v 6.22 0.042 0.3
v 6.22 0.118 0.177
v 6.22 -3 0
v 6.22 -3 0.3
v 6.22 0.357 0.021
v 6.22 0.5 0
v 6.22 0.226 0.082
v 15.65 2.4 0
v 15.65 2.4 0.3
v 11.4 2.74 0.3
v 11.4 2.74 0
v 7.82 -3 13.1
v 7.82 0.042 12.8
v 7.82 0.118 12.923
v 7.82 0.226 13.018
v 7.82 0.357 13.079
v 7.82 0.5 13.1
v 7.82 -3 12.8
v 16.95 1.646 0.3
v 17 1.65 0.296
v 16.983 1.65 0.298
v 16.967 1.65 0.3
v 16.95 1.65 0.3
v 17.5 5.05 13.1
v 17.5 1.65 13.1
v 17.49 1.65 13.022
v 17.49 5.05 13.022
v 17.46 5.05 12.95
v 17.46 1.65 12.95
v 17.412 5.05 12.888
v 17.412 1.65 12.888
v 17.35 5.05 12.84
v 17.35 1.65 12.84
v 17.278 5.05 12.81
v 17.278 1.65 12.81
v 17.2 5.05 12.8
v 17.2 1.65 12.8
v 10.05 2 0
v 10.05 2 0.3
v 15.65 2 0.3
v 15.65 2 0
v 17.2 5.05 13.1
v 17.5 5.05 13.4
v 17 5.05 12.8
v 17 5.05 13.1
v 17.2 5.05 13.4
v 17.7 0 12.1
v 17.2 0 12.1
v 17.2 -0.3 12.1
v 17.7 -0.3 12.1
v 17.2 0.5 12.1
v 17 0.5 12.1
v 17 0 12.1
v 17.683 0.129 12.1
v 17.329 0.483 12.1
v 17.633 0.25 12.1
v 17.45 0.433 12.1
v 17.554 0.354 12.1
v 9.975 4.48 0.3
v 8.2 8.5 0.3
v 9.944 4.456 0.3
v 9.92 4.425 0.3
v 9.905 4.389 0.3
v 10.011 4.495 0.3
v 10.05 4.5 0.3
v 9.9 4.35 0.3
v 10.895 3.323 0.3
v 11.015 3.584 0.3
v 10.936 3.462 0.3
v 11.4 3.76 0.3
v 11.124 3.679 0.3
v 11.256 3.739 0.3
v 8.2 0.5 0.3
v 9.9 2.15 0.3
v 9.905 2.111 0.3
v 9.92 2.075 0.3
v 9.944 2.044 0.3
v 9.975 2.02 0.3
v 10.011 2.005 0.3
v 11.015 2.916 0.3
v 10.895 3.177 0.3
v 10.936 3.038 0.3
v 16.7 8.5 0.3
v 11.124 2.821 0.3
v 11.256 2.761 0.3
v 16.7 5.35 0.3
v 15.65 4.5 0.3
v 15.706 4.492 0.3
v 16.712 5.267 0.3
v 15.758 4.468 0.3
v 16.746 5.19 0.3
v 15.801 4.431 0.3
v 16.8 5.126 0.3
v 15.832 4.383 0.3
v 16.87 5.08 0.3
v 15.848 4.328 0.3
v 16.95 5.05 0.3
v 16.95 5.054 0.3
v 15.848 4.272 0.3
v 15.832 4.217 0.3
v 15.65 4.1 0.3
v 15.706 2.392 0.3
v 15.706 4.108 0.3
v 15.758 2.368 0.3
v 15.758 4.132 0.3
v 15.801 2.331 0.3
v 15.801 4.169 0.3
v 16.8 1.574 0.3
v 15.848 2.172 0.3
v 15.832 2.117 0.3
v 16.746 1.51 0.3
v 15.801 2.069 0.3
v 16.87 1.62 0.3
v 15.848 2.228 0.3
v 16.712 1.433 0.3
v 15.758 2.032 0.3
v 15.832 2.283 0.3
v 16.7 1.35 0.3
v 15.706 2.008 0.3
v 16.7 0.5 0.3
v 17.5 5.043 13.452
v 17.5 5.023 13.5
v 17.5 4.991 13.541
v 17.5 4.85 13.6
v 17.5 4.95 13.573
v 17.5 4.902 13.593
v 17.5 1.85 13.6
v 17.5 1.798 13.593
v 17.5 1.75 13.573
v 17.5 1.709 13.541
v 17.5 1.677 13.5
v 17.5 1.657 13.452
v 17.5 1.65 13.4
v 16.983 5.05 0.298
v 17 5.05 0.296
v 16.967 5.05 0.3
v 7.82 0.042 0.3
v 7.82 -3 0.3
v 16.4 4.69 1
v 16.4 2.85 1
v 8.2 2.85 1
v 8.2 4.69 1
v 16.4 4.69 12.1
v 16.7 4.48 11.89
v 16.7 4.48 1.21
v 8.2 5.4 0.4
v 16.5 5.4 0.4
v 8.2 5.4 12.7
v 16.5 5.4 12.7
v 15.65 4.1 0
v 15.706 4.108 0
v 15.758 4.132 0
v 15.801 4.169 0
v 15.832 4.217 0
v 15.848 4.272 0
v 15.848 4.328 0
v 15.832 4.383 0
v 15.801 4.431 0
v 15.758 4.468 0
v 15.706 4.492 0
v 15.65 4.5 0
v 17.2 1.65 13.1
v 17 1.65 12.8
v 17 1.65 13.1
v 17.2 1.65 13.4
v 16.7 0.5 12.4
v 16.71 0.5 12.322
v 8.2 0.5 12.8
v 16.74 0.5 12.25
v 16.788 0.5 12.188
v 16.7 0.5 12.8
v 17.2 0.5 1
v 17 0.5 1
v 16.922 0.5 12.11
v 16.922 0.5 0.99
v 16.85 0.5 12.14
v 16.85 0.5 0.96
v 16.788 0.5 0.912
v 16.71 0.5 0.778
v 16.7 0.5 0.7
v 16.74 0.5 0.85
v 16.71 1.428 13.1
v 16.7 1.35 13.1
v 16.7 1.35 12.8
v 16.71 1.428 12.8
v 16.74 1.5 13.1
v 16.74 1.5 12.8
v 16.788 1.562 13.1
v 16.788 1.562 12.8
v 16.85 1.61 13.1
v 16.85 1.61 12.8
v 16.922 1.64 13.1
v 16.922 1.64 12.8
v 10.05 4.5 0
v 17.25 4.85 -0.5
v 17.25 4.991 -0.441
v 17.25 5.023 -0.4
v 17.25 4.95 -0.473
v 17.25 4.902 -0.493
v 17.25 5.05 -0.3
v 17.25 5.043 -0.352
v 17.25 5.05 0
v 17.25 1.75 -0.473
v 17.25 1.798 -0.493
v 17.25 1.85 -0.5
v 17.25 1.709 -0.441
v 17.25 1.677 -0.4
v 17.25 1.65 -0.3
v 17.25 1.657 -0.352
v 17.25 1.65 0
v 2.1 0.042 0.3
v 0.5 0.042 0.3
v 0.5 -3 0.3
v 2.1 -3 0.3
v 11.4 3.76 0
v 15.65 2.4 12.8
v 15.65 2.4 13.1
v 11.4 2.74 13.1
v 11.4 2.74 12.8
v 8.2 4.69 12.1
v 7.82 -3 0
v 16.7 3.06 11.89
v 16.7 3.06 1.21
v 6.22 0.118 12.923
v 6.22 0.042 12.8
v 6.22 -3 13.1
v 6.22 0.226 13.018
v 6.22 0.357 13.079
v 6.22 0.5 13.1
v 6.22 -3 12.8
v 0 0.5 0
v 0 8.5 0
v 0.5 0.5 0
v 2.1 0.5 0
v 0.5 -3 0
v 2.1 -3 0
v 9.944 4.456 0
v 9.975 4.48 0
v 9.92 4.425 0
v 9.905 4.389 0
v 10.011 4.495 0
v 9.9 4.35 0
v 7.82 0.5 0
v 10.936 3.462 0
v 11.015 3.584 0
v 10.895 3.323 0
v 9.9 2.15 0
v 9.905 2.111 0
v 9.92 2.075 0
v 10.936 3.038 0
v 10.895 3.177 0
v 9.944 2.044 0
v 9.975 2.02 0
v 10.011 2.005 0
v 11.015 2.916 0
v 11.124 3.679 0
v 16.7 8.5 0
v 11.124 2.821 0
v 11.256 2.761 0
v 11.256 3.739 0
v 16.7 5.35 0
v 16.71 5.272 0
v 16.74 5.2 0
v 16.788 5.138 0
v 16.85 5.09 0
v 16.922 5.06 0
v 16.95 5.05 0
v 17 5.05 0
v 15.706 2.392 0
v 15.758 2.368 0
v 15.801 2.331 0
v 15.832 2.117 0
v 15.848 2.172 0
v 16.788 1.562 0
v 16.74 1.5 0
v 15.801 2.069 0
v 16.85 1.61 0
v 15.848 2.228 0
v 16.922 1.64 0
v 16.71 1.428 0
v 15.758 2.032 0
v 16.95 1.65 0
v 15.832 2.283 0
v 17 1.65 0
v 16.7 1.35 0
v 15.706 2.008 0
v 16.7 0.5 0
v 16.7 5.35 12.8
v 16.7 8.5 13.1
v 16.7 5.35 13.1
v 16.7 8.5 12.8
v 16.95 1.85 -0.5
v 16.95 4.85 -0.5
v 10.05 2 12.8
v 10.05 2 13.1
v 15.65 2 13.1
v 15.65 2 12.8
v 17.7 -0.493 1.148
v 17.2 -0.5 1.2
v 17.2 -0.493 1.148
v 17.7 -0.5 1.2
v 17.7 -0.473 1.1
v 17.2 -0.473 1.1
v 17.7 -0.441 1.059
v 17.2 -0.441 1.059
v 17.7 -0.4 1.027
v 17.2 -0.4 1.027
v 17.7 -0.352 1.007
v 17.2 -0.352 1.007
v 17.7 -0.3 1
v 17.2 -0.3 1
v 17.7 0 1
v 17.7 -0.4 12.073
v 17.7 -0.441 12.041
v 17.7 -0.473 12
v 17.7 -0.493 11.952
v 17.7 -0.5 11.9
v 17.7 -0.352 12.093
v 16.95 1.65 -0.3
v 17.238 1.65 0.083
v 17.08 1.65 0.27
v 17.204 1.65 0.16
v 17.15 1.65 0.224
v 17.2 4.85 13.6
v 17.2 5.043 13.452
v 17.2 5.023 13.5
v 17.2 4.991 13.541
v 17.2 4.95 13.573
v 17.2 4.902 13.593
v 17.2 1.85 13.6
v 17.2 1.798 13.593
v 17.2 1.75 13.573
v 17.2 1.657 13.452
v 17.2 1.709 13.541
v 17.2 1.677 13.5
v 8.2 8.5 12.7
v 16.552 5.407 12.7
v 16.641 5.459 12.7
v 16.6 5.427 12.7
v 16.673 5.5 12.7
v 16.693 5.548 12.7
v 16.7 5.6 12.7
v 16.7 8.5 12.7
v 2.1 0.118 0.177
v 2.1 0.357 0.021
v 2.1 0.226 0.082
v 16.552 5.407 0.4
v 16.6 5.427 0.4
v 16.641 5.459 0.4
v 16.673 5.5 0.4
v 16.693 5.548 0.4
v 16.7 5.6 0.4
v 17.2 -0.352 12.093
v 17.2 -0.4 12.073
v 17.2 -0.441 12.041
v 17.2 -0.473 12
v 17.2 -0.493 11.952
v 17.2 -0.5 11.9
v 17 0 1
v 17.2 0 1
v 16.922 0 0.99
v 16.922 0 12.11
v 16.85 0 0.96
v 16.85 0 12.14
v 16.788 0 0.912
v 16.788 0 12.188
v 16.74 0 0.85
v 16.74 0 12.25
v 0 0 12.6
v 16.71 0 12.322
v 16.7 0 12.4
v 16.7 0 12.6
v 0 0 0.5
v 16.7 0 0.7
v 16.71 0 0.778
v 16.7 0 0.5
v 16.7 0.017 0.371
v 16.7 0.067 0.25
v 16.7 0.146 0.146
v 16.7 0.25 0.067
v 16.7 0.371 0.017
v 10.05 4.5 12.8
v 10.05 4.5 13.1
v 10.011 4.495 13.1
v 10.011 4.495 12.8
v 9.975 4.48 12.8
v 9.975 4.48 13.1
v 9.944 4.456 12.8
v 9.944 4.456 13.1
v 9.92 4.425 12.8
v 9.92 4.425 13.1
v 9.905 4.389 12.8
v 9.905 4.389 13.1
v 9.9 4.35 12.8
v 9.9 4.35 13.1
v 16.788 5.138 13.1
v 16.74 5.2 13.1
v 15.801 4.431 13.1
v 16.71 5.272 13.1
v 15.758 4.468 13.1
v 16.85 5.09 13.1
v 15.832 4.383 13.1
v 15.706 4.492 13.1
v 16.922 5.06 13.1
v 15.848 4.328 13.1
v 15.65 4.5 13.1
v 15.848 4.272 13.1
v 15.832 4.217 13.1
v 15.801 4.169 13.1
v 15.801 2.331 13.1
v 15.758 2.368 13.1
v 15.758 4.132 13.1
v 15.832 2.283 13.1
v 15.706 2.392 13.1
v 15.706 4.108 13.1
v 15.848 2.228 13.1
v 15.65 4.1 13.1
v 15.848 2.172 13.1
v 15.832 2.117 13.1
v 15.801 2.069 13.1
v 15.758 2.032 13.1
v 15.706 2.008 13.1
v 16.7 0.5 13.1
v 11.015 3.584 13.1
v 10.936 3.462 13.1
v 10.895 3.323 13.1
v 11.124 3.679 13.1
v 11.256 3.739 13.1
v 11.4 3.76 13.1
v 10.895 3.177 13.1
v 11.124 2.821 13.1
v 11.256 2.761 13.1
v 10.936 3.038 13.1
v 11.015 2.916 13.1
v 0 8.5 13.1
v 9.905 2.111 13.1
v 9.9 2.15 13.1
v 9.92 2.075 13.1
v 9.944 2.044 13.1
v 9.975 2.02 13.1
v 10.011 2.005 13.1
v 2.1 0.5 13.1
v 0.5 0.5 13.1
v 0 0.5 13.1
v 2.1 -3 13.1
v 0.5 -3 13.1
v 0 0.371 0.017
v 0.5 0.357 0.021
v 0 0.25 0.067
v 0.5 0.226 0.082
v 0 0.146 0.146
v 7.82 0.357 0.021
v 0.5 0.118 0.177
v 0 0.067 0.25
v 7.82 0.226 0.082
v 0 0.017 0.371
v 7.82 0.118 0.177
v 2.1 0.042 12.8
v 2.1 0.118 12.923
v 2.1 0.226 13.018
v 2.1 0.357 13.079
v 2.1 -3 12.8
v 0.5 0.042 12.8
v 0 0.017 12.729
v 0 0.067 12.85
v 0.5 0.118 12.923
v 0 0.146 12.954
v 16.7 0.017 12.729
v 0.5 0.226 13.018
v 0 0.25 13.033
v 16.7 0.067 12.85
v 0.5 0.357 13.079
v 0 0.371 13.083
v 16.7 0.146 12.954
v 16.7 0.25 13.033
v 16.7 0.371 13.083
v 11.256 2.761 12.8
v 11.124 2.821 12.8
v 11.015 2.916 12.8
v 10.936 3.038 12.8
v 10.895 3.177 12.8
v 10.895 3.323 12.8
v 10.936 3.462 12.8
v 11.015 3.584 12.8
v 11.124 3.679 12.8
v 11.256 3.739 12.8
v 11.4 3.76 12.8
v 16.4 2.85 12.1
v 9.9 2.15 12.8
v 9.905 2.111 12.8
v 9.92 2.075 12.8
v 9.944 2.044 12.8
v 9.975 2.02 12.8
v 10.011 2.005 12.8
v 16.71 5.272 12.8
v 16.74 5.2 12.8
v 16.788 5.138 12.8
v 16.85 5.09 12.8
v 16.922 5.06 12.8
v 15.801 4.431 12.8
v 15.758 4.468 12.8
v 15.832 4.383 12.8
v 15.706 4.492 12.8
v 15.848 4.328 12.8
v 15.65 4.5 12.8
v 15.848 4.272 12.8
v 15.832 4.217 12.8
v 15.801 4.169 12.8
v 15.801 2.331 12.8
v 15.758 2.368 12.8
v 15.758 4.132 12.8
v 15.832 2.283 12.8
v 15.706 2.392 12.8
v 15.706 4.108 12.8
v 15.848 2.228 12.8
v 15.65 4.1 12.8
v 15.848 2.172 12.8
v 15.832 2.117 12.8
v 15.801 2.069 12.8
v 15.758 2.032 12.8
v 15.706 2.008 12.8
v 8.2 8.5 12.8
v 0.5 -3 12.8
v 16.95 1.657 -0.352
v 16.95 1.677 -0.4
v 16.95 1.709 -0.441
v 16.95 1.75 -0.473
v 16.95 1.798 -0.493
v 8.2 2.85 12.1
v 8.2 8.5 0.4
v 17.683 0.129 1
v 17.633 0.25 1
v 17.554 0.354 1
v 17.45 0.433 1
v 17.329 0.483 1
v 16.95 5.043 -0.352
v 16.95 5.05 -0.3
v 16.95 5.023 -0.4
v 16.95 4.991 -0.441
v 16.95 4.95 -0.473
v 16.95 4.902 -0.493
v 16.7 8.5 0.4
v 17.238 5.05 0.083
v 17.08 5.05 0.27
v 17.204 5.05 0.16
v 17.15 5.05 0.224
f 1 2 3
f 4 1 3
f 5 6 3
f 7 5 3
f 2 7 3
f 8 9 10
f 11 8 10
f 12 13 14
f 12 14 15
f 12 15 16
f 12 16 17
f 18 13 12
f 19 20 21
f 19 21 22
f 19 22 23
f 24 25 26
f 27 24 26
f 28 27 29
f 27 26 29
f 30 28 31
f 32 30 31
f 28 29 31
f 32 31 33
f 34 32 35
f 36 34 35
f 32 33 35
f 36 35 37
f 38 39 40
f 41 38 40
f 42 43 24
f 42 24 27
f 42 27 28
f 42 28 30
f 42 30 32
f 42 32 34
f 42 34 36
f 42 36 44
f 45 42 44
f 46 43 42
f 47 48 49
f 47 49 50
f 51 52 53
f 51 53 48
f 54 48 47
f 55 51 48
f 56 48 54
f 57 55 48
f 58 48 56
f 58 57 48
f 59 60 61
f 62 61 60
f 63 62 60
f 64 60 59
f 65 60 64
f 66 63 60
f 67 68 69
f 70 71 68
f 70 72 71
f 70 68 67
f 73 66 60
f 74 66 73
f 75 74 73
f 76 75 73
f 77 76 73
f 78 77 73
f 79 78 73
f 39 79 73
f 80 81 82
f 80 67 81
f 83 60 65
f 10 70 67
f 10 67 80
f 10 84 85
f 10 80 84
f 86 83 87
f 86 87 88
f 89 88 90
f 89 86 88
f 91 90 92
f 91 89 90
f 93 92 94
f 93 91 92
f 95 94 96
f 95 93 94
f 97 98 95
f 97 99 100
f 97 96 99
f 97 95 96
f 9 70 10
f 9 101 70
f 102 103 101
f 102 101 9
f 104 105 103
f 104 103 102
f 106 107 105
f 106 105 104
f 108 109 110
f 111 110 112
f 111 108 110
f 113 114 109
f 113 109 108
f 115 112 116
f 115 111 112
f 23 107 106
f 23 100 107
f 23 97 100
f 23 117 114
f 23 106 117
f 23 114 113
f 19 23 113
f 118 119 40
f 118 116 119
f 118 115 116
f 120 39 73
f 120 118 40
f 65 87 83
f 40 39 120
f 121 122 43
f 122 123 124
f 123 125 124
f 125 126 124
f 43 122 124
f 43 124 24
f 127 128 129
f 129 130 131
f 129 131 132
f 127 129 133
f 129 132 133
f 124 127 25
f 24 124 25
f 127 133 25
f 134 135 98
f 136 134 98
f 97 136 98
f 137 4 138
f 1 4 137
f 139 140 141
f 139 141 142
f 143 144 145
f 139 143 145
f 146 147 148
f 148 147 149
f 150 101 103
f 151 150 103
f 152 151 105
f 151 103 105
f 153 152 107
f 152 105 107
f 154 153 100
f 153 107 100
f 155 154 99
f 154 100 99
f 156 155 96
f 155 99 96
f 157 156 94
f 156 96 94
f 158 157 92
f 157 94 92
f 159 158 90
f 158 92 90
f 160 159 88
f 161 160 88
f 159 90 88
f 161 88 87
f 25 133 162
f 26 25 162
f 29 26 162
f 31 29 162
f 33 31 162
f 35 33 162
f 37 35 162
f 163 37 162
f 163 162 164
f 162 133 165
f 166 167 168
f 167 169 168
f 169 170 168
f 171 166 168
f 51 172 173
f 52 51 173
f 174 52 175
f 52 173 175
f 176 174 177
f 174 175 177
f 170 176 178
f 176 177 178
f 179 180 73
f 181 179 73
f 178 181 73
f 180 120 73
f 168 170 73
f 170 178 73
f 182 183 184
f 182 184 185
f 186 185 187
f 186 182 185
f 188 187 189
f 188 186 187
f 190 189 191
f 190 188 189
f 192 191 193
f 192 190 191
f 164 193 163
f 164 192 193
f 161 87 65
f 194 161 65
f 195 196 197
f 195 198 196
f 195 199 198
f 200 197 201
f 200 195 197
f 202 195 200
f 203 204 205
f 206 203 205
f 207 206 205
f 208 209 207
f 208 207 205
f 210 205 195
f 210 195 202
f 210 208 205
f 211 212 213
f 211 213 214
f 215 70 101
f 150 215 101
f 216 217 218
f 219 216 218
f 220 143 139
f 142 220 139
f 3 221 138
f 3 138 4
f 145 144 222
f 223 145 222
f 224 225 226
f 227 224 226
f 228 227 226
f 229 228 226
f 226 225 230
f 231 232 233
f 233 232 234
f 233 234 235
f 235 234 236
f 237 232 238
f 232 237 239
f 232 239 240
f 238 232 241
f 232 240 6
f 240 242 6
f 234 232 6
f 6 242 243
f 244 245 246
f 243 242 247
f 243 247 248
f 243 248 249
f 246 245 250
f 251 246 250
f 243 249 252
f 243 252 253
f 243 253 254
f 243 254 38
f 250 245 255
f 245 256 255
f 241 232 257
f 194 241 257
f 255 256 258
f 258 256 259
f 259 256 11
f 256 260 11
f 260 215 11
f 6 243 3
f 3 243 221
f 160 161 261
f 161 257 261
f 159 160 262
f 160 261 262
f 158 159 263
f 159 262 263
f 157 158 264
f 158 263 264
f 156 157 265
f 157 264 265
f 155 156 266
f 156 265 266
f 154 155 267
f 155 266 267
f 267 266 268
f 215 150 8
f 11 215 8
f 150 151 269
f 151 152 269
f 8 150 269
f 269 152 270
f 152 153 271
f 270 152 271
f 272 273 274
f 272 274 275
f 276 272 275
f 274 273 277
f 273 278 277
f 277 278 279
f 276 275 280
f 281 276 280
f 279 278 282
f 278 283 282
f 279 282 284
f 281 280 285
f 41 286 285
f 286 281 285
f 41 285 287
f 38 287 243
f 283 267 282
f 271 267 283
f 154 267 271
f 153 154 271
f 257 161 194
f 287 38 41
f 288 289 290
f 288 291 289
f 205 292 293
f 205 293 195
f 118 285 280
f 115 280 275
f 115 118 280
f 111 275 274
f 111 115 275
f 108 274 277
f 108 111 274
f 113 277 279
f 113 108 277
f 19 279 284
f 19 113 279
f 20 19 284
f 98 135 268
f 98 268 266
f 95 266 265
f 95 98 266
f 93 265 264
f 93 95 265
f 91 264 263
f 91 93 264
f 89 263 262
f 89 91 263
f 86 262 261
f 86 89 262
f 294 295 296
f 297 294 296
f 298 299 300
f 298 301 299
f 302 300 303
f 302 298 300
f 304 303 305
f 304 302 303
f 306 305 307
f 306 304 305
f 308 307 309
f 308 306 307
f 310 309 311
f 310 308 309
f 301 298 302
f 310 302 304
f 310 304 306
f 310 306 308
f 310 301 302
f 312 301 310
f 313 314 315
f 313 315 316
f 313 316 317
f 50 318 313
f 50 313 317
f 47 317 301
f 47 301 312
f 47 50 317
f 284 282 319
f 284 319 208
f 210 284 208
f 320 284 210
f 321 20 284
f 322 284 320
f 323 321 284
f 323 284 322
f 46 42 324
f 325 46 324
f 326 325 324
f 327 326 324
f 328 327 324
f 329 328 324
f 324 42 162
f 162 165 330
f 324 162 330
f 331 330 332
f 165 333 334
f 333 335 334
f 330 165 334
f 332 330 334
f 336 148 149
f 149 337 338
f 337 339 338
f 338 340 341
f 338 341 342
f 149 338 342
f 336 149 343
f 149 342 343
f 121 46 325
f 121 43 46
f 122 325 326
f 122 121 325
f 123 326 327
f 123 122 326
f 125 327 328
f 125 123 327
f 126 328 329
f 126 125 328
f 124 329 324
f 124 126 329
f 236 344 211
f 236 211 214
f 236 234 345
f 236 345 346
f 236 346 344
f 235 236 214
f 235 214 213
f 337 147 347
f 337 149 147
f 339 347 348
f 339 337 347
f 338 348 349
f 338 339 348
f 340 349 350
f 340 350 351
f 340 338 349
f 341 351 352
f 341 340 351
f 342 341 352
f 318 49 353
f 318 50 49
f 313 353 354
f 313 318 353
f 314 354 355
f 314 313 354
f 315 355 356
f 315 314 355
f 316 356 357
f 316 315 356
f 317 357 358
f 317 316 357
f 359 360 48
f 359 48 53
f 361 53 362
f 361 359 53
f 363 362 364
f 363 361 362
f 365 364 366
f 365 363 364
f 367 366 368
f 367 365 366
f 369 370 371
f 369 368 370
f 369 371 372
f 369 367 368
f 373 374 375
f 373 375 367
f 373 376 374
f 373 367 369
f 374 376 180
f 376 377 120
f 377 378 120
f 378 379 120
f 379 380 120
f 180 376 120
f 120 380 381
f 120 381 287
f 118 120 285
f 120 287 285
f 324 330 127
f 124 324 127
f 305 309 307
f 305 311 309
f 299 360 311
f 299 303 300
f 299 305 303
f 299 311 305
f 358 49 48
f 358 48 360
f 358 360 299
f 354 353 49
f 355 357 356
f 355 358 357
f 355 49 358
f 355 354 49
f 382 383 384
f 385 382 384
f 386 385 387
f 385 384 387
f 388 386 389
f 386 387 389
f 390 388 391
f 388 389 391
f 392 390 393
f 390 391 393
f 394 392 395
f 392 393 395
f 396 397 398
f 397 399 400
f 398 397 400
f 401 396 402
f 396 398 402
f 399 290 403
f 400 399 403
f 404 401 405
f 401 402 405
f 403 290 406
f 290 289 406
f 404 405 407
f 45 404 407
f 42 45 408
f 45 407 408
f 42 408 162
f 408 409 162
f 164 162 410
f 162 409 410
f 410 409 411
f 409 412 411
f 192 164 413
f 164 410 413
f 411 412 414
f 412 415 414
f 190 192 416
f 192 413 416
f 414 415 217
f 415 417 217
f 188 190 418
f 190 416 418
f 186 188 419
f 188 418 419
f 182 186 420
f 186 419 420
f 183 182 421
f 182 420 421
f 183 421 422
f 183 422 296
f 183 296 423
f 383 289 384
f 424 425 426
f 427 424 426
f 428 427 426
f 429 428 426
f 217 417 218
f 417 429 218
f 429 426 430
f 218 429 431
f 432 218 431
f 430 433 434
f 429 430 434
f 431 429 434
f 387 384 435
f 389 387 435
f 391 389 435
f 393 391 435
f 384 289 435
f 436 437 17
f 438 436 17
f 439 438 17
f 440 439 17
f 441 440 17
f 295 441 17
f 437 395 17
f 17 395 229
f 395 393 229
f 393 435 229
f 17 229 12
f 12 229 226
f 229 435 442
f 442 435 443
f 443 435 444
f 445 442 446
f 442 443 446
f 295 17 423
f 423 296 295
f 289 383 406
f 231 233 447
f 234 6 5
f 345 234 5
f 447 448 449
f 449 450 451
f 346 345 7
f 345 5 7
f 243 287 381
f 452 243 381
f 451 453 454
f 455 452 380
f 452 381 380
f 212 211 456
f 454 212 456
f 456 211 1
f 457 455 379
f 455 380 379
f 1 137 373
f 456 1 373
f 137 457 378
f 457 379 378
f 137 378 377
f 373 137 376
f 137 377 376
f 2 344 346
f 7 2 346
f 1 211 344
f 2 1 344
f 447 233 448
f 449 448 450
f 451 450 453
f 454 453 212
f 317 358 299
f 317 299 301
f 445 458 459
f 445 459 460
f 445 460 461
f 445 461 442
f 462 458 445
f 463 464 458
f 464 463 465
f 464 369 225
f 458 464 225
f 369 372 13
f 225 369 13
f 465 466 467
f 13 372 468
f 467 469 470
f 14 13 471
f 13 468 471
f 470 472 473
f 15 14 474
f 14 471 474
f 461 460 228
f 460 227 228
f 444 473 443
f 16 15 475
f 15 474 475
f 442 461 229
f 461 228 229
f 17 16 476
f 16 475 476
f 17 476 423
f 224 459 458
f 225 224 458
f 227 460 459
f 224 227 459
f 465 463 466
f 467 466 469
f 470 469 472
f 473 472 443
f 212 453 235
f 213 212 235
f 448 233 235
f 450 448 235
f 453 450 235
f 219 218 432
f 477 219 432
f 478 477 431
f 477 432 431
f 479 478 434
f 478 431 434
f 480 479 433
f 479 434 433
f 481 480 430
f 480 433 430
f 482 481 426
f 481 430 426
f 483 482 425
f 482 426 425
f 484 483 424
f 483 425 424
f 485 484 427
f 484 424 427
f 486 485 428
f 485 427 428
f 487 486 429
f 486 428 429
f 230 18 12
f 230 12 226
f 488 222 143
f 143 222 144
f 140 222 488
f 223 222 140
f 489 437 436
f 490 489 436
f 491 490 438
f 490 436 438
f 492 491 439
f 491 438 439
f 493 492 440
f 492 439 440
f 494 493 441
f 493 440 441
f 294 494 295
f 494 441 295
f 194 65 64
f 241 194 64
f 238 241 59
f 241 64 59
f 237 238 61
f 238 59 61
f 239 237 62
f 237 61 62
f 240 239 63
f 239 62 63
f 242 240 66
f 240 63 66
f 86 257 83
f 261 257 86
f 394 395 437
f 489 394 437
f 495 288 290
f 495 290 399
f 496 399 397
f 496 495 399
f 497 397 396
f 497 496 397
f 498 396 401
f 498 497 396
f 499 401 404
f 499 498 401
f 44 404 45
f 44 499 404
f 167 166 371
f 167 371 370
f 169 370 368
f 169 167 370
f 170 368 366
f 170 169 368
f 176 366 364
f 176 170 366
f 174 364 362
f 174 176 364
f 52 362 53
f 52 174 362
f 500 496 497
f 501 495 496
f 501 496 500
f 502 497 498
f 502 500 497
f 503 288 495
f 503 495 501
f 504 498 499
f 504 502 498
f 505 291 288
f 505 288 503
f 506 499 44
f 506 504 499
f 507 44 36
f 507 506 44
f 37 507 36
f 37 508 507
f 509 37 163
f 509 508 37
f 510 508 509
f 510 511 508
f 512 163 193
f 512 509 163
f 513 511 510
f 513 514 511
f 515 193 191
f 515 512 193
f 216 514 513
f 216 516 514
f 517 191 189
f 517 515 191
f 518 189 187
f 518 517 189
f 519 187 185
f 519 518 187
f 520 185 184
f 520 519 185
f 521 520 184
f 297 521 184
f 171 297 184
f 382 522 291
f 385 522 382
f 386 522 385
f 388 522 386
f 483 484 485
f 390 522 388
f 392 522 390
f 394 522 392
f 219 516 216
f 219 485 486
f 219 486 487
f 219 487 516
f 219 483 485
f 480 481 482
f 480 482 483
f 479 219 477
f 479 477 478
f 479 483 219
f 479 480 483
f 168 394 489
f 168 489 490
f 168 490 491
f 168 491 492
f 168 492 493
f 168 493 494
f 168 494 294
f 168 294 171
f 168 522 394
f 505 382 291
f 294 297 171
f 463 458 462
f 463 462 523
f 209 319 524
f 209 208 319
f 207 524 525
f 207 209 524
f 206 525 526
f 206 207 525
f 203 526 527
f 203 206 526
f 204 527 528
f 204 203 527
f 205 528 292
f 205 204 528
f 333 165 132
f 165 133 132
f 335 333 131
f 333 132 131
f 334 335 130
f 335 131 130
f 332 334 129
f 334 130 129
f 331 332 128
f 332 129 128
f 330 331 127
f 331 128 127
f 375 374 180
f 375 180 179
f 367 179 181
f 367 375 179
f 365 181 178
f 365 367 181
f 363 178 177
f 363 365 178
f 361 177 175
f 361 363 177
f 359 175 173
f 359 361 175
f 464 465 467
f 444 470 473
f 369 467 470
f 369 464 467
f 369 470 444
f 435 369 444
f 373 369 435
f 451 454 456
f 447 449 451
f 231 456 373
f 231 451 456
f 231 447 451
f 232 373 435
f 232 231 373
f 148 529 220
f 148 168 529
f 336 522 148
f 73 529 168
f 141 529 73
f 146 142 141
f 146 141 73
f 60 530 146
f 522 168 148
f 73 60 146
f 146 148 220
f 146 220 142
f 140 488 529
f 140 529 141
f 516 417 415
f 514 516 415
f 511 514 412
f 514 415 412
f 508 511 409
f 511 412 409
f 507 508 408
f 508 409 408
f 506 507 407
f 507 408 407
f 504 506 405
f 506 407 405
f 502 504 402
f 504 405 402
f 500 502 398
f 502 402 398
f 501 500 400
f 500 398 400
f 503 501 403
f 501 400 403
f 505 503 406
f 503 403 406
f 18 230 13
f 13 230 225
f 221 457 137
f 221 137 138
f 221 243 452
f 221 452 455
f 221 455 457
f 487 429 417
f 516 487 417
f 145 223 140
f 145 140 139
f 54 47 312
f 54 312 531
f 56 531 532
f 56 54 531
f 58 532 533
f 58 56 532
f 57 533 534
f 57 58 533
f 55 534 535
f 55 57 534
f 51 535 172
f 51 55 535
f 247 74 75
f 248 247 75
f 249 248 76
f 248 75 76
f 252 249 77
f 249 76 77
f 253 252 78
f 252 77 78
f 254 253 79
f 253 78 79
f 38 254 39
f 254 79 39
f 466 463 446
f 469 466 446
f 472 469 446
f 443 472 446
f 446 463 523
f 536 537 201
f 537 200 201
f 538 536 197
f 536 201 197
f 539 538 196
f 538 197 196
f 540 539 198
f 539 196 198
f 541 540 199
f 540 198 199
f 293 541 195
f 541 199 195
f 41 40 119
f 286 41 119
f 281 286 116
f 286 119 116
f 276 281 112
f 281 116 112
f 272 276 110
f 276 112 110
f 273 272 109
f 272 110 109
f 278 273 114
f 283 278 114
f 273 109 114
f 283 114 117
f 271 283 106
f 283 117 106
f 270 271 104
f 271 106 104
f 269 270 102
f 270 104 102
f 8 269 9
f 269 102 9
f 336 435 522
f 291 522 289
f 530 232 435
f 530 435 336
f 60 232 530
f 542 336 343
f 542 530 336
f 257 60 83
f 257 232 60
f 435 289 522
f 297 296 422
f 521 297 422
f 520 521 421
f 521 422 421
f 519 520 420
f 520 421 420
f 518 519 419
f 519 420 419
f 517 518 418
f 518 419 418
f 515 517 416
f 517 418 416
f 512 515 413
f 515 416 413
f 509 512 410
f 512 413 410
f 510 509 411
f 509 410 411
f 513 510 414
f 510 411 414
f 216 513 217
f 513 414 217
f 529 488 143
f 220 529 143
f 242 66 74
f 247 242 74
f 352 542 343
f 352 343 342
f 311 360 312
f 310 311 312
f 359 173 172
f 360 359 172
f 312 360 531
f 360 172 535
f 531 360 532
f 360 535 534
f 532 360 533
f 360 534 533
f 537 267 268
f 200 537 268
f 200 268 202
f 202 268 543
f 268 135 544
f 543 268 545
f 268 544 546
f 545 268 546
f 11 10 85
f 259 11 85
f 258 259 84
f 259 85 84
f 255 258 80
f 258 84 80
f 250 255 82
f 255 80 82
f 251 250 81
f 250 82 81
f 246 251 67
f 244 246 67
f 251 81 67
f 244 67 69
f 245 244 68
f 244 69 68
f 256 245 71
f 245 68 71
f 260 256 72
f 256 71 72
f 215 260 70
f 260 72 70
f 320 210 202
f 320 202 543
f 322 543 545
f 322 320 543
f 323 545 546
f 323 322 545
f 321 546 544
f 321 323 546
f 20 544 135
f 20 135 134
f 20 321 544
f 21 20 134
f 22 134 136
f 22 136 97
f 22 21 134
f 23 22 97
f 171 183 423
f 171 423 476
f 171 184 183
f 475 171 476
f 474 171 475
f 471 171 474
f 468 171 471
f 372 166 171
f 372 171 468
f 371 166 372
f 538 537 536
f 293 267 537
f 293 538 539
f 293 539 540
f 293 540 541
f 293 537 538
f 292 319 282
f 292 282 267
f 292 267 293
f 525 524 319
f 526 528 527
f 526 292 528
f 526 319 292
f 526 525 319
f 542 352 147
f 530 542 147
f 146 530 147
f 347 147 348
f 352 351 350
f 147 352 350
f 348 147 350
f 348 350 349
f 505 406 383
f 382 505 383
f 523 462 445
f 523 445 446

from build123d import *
from OCP.BRepFilletAPI import BRepFilletAPI_MakeChamfer

# Parameters (mm, degrees)
BOSS_EXTRU_1_DEPTH      = 13.1
ESQUISSE2_W             = 12.5
ESQUISSE2_H             = 3
ENL_V_MAT_EXTRU_1_DEPTH = 7.4
ESQUISSE3_W             = 11.1
ESQUISSE3_H             = 1.84
ENL_V_MAT_EXTRU_2_DEPTH = 8.5
ESQUISSE4_W             = 0.3
ESQUISSE4_H             = 3.4
BOSS_EXTRU_2_DEPTH      = 0.5
BOSS_EXTRU_3_DEPTH      = 3.4
BOSS_EXTRU_4_DEPTH      = 3.4
CHANFREIN1_SIZE         = 0.3
CHANFREIN1_SIZE2        = 0.210062261
CHANFREIN2_SIZE         = 0.3
CHANFREIN2_SIZE2        = 0.210062261
CHANFREIN3_SIZE         = 0.3
CHANFREIN3_SIZE2        = 0.210062261
CONG_1_R                = 0.2
CONG_2_R                = 0.2
ESQUISSE10_W            = 0.5
ESQUISSE10_H            = 0.5
ENL_V_MAT_EXTRU_3_DEPTH = 1
ESQUISSE11_W            = 0.5
ESQUISSE11_H            = 0.5
ENL_V_MAT_EXTRU_4_DEPTH = 1
BOSS_EXTRU_5_DEPTH      = 11.1
CONG_3_R                = 0.5
CONG_4_R                = 0.5
ENL_V_MAT_EXTRU_5_DEPTH = 0.3
ENL_V_START             = -0.3
ENL_V_MAT_EXTRU_6_DEPTH = 0.3
CONG_5_R                = 0.2
CONG_6_R                = 0.3


with BuildPart() as part:
    # Esquisse1 → Boss.-Extru.1 (new body)
    with BuildSketch(Plane.XY):
        Polygon((0, 0), (0, 8.5), (16.7, 8.5), (16.7, 0.5), (17.2, 0.5), (17.2, 0), (7.82, 0), (7.82, -3), (6.22, -3), (6.22, 0), (2.1, 0), (2.1, -3), (0.5, -3), (0.5, 0), align=None)
    extrude(amount=BOSS_EXTRU_1_DEPTH)

    # Esquisse2 → Enlèv. mat.-Extru.1 (cut)
    with BuildSketch(Plane.ZY.offset(-0.5)):
        with Locations((6.55, -1.5)):
            Rectangle(ESQUISSE2_W, ESQUISSE2_H)
    extrude(amount=-ENL_V_MAT_EXTRU_1_DEPTH, mode=Mode.SUBTRACT)

    # Esquisse3 → Enlèv. mat.-Extru.2 (cut)
    with BuildSketch(Plane(origin=(16.7, 0, 0), x_dir=(0, 0, -1), z_dir=(1, 0, 0))):
        Polygon((-12.8, 8.5), (-12.8, 0.5), (-0.3, 0.5), (-0.3, 8.5), (-0.4, 8.5), (-0.4, 5.4), (-12.7, 5.4), (-12.7, 8.5), align=None)
        with Locations((-6.55, 3.77)):
            Rectangle(ESQUISSE3_W, ESQUISSE3_H, mode=Mode.SUBTRACT)
    extrude(amount=-ENL_V_MAT_EXTRU_2_DEPTH, mode=Mode.SUBTRACT)

    # Esquisse4 → Boss.-Extru.2 (add)
    with BuildSketch(Plane(origin=(16.7, 0, 0), x_dir=(0, 0, -1), z_dir=(1, 0, 0))):
        with Locations((-12.95, 3.35)):
            Rectangle(ESQUISSE4_W, ESQUISSE4_H)
    extrude(amount=BOSS_EXTRU_2_DEPTH)

    # Esquisse8 → Boss.-Extru.3 (add)
    with BuildSketch(Plane(origin=(17.2, 1.65, 13.1), x_dir=(1, 0, 0), z_dir=(0, -1, 0))):
        with BuildLine():
            Line((0, 0), (0, 0.5))
            Line((0, 0.5), (0.3, 0.5))
            Line((0.3, 0.5), (0.3, 0))
            ThreePointArc((0.3, 0), (0.212132034, -0.212132034), (0, -0.3))
            Line((0, -0.3), (0, 0))
        make_face()
    extrude(amount=-BOSS_EXTRU_3_DEPTH)

    # Esquisse9 → Boss.-Extru.4 (add)
    with BuildSketch(Plane(origin=(17.2, 1.65, 13.1), x_dir=(1, 0, 0), z_dir=(0, -1, 0))):
        with BuildLine():
            Line((-0.5, -13.1), (-0.25, -13.1))
            Line((-0.25, -13.1), (-0.25, -13.6))
            Line((-0.25, -13.6), (0.05, -13.6))
            Line((0.05, -13.6), (0.05, -13.1))
            ThreePointArc((0.05, -13.1), (-0.037867966, -12.887867966), (-0.25, -12.8))
            Line((-0.25, -12.8), (-0.5, -12.8))
            Line((-0.5, -12.8), (-0.5, -13.1))
        make_face()
    extrude(amount=-BOSS_EXTRU_4_DEPTH)

    # Chanfrein1
    chanfrein1_edges = [part.edges().sort_by_distance(p)[0] for p in [
        (16.7, 4.69, 6.55),
    ]]
    chanfrein1_side = [part.faces().sort_by_distance(p)[0] for p in [
        (12.45, 4.69, 6.55),
    ]]
    chamfer(chanfrein1_edges, length=CHANFREIN1_SIZE, length2=CHANFREIN1_SIZE2, reference=chanfrein1_side[0])

    # Chanfrein2
    chanfrein2_edges = [part.edges().sort_by_distance(p)[0] for p in [
        (16.7, 3.664968869, 1),
    ]]
    chanfrein2_side = [part.faces().sort_by_distance(p)[0] for p in [
        (12.441622268, 3.768284121, 1),
    ]]
    chamfer(chanfrein2_edges, length=CHANFREIN2_SIZE, length2=CHANFREIN2_SIZE2, reference=chanfrein2_side[0])

    # Chanfrein3: one chamfer whose edges measure the first distance from different faces: ONE call of the kernel's chamfer builder (chamfer() names one face for all edges)
    chanfrein3_edges_1 = [part.edges().sort_by_distance(p)[0] for p in [
        (16.7, 3.664968869, 12.1),
    ]]
    chanfrein3_side_1 = [part.faces().sort_by_distance(p)[0] for p in [
        (12.441622268, 3.768284121, 12.1),
    ]]
    chanfrein3_edges_2 = [part.edges().sort_by_distance(p)[0] for p in [
        (16.7, 2.85, 6.655031131),
    ]]
    chanfrein3_side_2 = [part.faces().sort_by_distance(p)[0] for p in [
        (12.448613594, 2.85, 6.551830718),
    ]]
    chanfrein3 = BRepFilletAPI_MakeChamfer(part.part.solid().wrapped)
    for e in chanfrein3_edges_1:
        chanfrein3.Add(CHANFREIN3_SIZE, CHANFREIN3_SIZE2, e.wrapped, chanfrein3_side_1[0].wrapped)  # the first distance lies on this face
    for e in chanfrein3_edges_2:
        chanfrein3.Add(CHANFREIN3_SIZE, CHANFREIN3_SIZE2, e.wrapped, chanfrein3_side_2[0].wrapped)  # the first distance lies on this face
    add(Compound.cast(chanfrein3.Shape()), mode=Mode.REPLACE)

    # Congé1
    cong_1_edges = [part.edges().sort_by_distance(p)[0] for p in [
        (16.7, 5.4, 6.55),
    ]]
    fillet(cong_1_edges, radius=CONG_1_R)

    # Congé2
    cong_2_edges = [part.edges().sort_by_distance(p)[0] for p in [
        (17.35, 5.05, 13.6),
        (17.35, 1.65, 13.6),
        (17.1, 5.05, -0.5),
        (17.1, 1.65, -0.5),
    ]]
    fillet(cong_2_edges, radius=CONG_2_R)

    # Esquisse10 → Enlèv. mat.-Extru.3 (cut)
    with BuildSketch(Plane(origin=(0, 0, 0), x_dir=(-1, 0, 0), z_dir=(0, 0, -1))):
        with Locations((-16.95, 0.25)):
            Rectangle(ESQUISSE10_W, ESQUISSE10_H)
    extrude(amount=-ENL_V_MAT_EXTRU_3_DEPTH, mode=Mode.SUBTRACT)

    # Esquisse11 → Enlèv. mat.-Extru.4 (cut)
    with BuildSketch(Plane.XY.offset(13.1)):
        with Locations((16.95, 0.25)):
            Rectangle(ESQUISSE11_W, ESQUISSE11_H)
    extrude(amount=-ENL_V_MAT_EXTRU_4_DEPTH, mode=Mode.SUBTRACT)

    # Esquisse12 → Boss.-Extru.5 (add)
    with BuildSketch(Plane.XY.offset(12.1)):
        with BuildLine():
            Line((17.2, 0.5), (17.2, 0))
            Line((17.2, 0), (17.2, -0.5))
            Line((17.2, -0.5), (17.7, -0.5))
            Line((17.7, -0.5), (17.7, 0))
            ThreePointArc((17.7, 0), (17.553553391, 0.353553391), (17.2, 0.5))
        make_face()
    extrude(amount=-BOSS_EXTRU_5_DEPTH)

    # Congé3
    # the kernel refuses this fillet: 0.5 mm, written as the material it adds along each edge
    # the kernel refuses this fillet: 0.5 mm, written as the material it takes off along each edge
    with BuildSketch(Plane(origin=(7.47, 0, 13.1), x_dir=(0, 1, 0), z_dir=(-1, 0, 0))) as cong_3_2_piece_1_section:
        with BuildLine():
            CenterArc((CONG_3_R, CONG_3_R), CONG_3_R, 180, 90)
            Line((0, CONG_3_R), (0, 0))
            Line((0, 0), (CONG_3_R, 0))
        make_face()
    cong_3_2_piece_1 = extrude(amount=6.62, mode=Mode.PRIVATE)
    cong_3_2_piece_1 = split(cong_3_2_piece_1, bisect_by=Plane(origin=(6.845, 0.012427722, 12.8), z_dir=(0, 0, -1)), keep=Keep.TOP, mode=Mode.PRIVATE)
    add(cong_3_2_piece_1, mode=Mode.SUBTRACT)
    with BuildSketch(Plane(origin=(6.22, 0, 13.1), x_dir=(0, 1, 0), z_dir=(-1, 0, 0))) as cong_3_2_piece_2:
        with BuildLine():
            CenterArc((CONG_3_R, CONG_3_R), CONG_3_R, 180, 90)
            Line((0, CONG_3_R), (0, 0))
            Line((0, 0), (CONG_3_R, 0))
        make_face()
    extrude(amount=4.12, mode=Mode.SUBTRACT)
    with BuildSketch(Plane(origin=(17.95, 0, 13.1), x_dir=(0, 1, 0), z_dir=(-1, 0, 0))) as cong_3_2_piece_3:
        with BuildLine():
            CenterArc((CONG_3_R, CONG_3_R), CONG_3_R, 180, 90)
            Line((0, CONG_3_R), (0, 0))
            Line((0, 0), (CONG_3_R, 0))
        make_face()
    extrude(amount=10.13, mode=Mode.SUBTRACT)
    with BuildSketch(Plane(origin=(17.95, 0, 13.1), x_dir=(0, 1, 0), z_dir=(-1, 0, 0))) as cong_3_2_piece_4_section:
        with BuildLine():
            CenterArc((CONG_3_R, CONG_3_R), CONG_3_R, 180, 90)
            Line((0, CONG_3_R), (0, 0))
            Line((0, 0), (CONG_3_R, 0))
        make_face()
    cong_3_2_piece_4 = extrude(amount=11.38, mode=Mode.PRIVATE)
    cong_3_2_piece_4 = split(cong_3_2_piece_4, bisect_by=Plane(origin=(7.195, 0.012427722, 12.8), z_dir=(0, 0, -1)), keep=Keep.TOP, mode=Mode.PRIVATE)
    add(cong_3_2_piece_4, mode=Mode.SUBTRACT)
    with BuildSketch(Plane(origin=(1.75, 0, 13.1), x_dir=(0, 1, 0), z_dir=(-1, 0, 0))) as cong_3_2_piece_5_section:
        with BuildLine():
            CenterArc((CONG_3_R, CONG_3_R), CONG_3_R, 180, 90)
            Line((0, CONG_3_R), (0, 0))
            Line((0, 0), (CONG_3_R, 0))
        make_face()
    cong_3_2_piece_5 = extrude(amount=3, mode=Mode.PRIVATE)
    cong_3_2_piece_5 = split(cong_3_2_piece_5, bisect_by=Plane(origin=(1.125, 0.012427722, 12.8), z_dir=(0, 0, -1)), keep=Keep.TOP, mode=Mode.PRIVATE)
    add(cong_3_2_piece_5, mode=Mode.SUBTRACT)
    with BuildSketch(Plane(origin=(0.5, 0, 13.1), x_dir=(0, 1, 0), z_dir=(-1, 0, 0))) as cong_3_2_piece_6:
        with BuildLine():
            CenterArc((CONG_3_R, CONG_3_R), CONG_3_R, 180, 90)
            Line((0, CONG_3_R), (0, 0))
            Line((0, 0), (CONG_3_R, 0))
        make_face()
    extrude(amount=1.75, mode=Mode.SUBTRACT)

    # Congé4
    # the kernel refuses this fillet: 0.5 mm, written as the material it adds along each edge
    # the kernel refuses this fillet: 0.5 mm, written as the material it takes off along each edge
    with BuildSketch(Plane(origin=(17.95, 0, 0), x_dir=(0, 1, 0), z_dir=(-1, 0, 0))) as cong_4_2_piece_1:
        with BuildLine():
            CenterArc((CONG_4_R, -CONG_4_R), CONG_4_R, 90, 90)
            Line((0, -CONG_4_R), (0, 0))
            Line((0, 0), (CONG_4_R, 0))
        make_face()
    extrude(amount=10.13, mode=Mode.SUBTRACT)
    with BuildSketch(Plane(origin=(17.95, 0, 0), x_dir=(0, 1, 0), z_dir=(-1, 0, 0))) as cong_4_2_piece_2_section:
        with BuildLine():
            CenterArc((CONG_4_R, -CONG_4_R), CONG_4_R, 90, 90)
            Line((0, -CONG_4_R), (0, 0))
            Line((0, 0), (CONG_4_R, 0))
        make_face()
    cong_4_2_piece_2 = extrude(amount=11.38, mode=Mode.PRIVATE)
    cong_4_2_piece_2 = split(cong_4_2_piece_2, bisect_by=Plane(origin=(7.195, 0.012427722, 0.3), z_dir=(0, 0, 1)), keep=Keep.TOP, mode=Mode.PRIVATE)
    add(cong_4_2_piece_2, mode=Mode.SUBTRACT)
    with BuildSketch(Plane(origin=(7.47, 0, 0), x_dir=(0, 1, 0), z_dir=(-1, 0, 0))) as cong_4_2_piece_3_section:
        with BuildLine():
            CenterArc((CONG_4_R, -CONG_4_R), CONG_4_R, 90, 90)
            Line((0, -CONG_4_R), (0, 0))
            Line((0, 0), (CONG_4_R, 0))
        make_face()
    cong_4_2_piece_3 = extrude(amount=6.62, mode=Mode.PRIVATE)
    cong_4_2_piece_3 = split(cong_4_2_piece_3, bisect_by=Plane(origin=(6.845, 0.012427722, 0.3), z_dir=(0, 0, 1)), keep=Keep.TOP, mode=Mode.PRIVATE)
    add(cong_4_2_piece_3, mode=Mode.SUBTRACT)
    with BuildSketch(Plane(origin=(6.22, 0, 0), x_dir=(0, 1, 0), z_dir=(-1, 0, 0))) as cong_4_2_piece_4:
        with BuildLine():
            CenterArc((CONG_4_R, -CONG_4_R), CONG_4_R, 90, 90)
            Line((0, -CONG_4_R), (0, 0))
            Line((0, 0), (CONG_4_R, 0))
        make_face()
    extrude(amount=4.12, mode=Mode.SUBTRACT)
    with BuildSketch(Plane(origin=(1.75, 0, 0), x_dir=(0, 1, 0), z_dir=(-1, 0, 0))) as cong_4_2_piece_5_section:
        with BuildLine():
            CenterArc((CONG_4_R, -CONG_4_R), CONG_4_R, 90, 90)
            Line((0, -CONG_4_R), (0, 0))
            Line((0, 0), (CONG_4_R, 0))
        make_face()
    cong_4_2_piece_5 = extrude(amount=3, mode=Mode.PRIVATE)
    cong_4_2_piece_5 = split(cong_4_2_piece_5, bisect_by=Plane(origin=(1.125, 0.012427722, 0.3), z_dir=(0, 0, 1)), keep=Keep.TOP, mode=Mode.PRIVATE)
    add(cong_4_2_piece_5, mode=Mode.SUBTRACT)
    with BuildSketch(Plane(origin=(0.5, 0, 0), x_dir=(0, 1, 0), z_dir=(-1, 0, 0))) as cong_4_2_piece_6:
        with BuildLine():
            CenterArc((CONG_4_R, -CONG_4_R), CONG_4_R, 90, 90)
            Line((0, -CONG_4_R), (0, 0))
            Line((0, 0), (CONG_4_R, 0))
        make_face()
    extrude(amount=1.75, mode=Mode.SUBTRACT)

    # Esquisse13 → Enlèv. mat.-Extru.5 (cut)
    with BuildSketch(Plane.XY.offset(13.1)):
        with BuildLine():
            Line((9.9, 4.35), (9.9, 2.15))
            ThreePointArc((9.9, 2.15), (9.943933983, 2.043933983), (10.05, 2))
            Line((10.05, 2), (15.65, 2))
            ThreePointArc((15.65, 2), (15.85, 2.2), (15.65, 2.4))
            Line((15.65, 2.4), (11.4, 2.74))
            ThreePointArc((11.4, 2.74), (10.89, 3.25), (11.4, 3.76))
            Line((11.4, 3.76), (15.65, 4.1))
            ThreePointArc((15.65, 4.1), (15.85, 4.3), (15.65, 4.5))
            Line((15.65, 4.5), (10.05, 4.5))
            ThreePointArc((10.05, 4.5), (9.943933983, 4.456066017), (9.9, 4.35))
        make_face()
    extrude(amount=-ENL_V_MAT_EXTRU_5_DEPTH, mode=Mode.SUBTRACT)

    # Esquisse14 → Enlèv. mat.-Extru.6 (cut)
    with BuildSketch(Plane(origin=(0, 0, 0), x_dir=(-1, 0, 0), z_dir=(0, 0, -1)).offset(ENL_V_START)):
        with BuildLine():
            Line((-15.65, 4.5), (-10.05, 4.5))
            ThreePointArc((-10.05, 4.5), (-9.943933983, 4.456066017), (-9.9, 4.35))
            Line((-9.9, 4.35), (-9.9, 2.15))
            ThreePointArc((-9.9, 2.15), (-9.943933983, 2.043933983), (-10.05, 2))
            Line((-10.05, 2), (-15.65, 2))
            ThreePointArc((-15.65, 2), (-15.85, 2.2), (-15.65, 2.4))
            Line((-15.65, 2.4), (-11.4, 2.74))
            ThreePointArc((-11.4, 2.74), (-10.89, 3.25), (-11.4, 3.76))
            Line((-11.4, 3.76), (-15.65, 4.1))
            ThreePointArc((-15.65, 4.1), (-15.85, 4.3), (-15.65, 4.5))
        make_face()
    extrude(amount=ENL_V_MAT_EXTRU_6_DEPTH, mode=Mode.SUBTRACT)

    # Congé5
    cong_5_edges = [part.edges().sort_by_distance(p)[0] for p in [
        (17.45, -0.5, 1),
        (17.45, -0.5, 12.1),
    ]]
    fillet(cong_5_edges, radius=CONG_5_R)

    # Congé6
    # the kernel refuses this fillet: 0.3 mm, written as the material it adds along each edge
    with BuildSketch(Plane(origin=(16.7, 5.05, 12.8), x_dir=(0, 1, 0), z_dir=(0, 0, 1)), Plane(origin=(16.7, 1.65, 13.1), x_dir=(0, -1, 0), z_dir=(0, 0, -1))) as cong_6_piece_1:
        with BuildLine():
            CenterArc((CONG_6_R, -CONG_6_R), CONG_6_R, 90, 90)
            Line((0, -CONG_6_R), (0, 0))
            Line((0, 0), (CONG_6_R, 0))
        make_face()
    extrude(amount=0.3)
    with BuildSketch(Plane(origin=(16.7, 1.65, 0.3), x_dir=(0, -1, 0), z_dir=(0, 0, -1))) as cong_6_piece_2_section:
        with BuildLine():
            CenterArc((CONG_6_R, -CONG_6_R), CONG_6_R, 90, 90)
            Line((0, -CONG_6_R), (0, 0))
            Line((0, 0), (CONG_6_R, 0))
        make_face()
    cong_6_piece_2 = extrude(amount=0.3, mode=Mode.PRIVATE)
    cong_6_piece_2 = split(cong_6_piece_2, bisect_by=Plane(origin=(16.95, 1.588616671, 0.116964364), z_dir=(-1, 0, 0)), keep=Keep.TOP, mode=Mode.PRIVATE)
    add(cong_6_piece_2)
    with BuildSketch(Plane(origin=(16.7, 1.65, 1.05), x_dir=(0, -1, 0), z_dir=(0, 0, -1))) as cong_6_piece_3_section:
        with BuildLine():
            CenterArc((CONG_6_R, -CONG_6_R), CONG_6_R, 90, 90)
            Line((0, -CONG_6_R), (0, 0))
            Line((0, 0), (CONG_6_R, 0))
        make_face()
    cong_6_piece_3 = extrude(amount=1.05, mode=Mode.PRIVATE)
    cong_6_piece_3 = cong_6_piece_3 & Plane(origin=(16.95, 1.648741802, 0), x_dir=(1, 0, 0), z_dir=(0, -1, 0)) * Cylinder(0.3, 4, mode=Mode.PRIVATE)
    add(cong_6_piece_3)
    with BuildSketch(Plane(origin=(16.7, 5.05, 0.3), x_dir=(0, 1, 0), z_dir=(0, 0, -1))) as cong_6_piece_4_section:
        with BuildLine():
            CenterArc((CONG_6_R, CONG_6_R), CONG_6_R, 180, 90)
            Line((0, CONG_6_R), (0, 0))
            Line((0, 0), (CONG_6_R, 0))
        make_face()
    cong_6_piece_4 = extrude(amount=0.3, mode=Mode.PRIVATE)
    cong_6_piece_4 = split(cong_6_piece_4, bisect_by=Plane(origin=(16.95, 5.111383329, 0.116964364), z_dir=(-1, 0, 0)), keep=Keep.TOP, mode=Mode.PRIVATE)
    add(cong_6_piece_4)
    with BuildSketch(Plane(origin=(16.7, 5.05, 1.05), x_dir=(0, 1, 0), z_dir=(0, 0, -1))) as cong_6_piece_5_section:
        with BuildLine():
            CenterArc((CONG_6_R, CONG_6_R), CONG_6_R, 180, 90)
            Line((0, CONG_6_R), (0, 0))
            Line((0, 0), (CONG_6_R, 0))
        make_face()
    cong_6_piece_5 = extrude(amount=1.05, mode=Mode.PRIVATE)
    cong_6_piece_5 = cong_6_piece_5 & Plane(origin=(16.95, 5.051258198, 0), x_dir=(1, 0, 0), z_dir=(0, -1, 0)) * Cylinder(0.3, 4, mode=Mode.PRIVATE)
    add(cong_6_piece_5)
    with BuildSketch(Plane(origin=(16.7, 0, 1), x_dir=(1, 0, 0), z_dir=(0, 1, 0)), Plane(origin=(16.7, 0.5, 12.1), x_dir=(1, 0, 0), z_dir=(0, -1, 0))) as cong_6_piece_6:
        with BuildLine():
            CenterArc((CONG_6_R, CONG_6_R), CONG_6_R, 180, 90)
            Line((0, CONG_6_R), (0, 0))
            Line((0, 0), (CONG_6_R, 0))
        make_face()
    extrude(amount=0.5)


solid = part.part
